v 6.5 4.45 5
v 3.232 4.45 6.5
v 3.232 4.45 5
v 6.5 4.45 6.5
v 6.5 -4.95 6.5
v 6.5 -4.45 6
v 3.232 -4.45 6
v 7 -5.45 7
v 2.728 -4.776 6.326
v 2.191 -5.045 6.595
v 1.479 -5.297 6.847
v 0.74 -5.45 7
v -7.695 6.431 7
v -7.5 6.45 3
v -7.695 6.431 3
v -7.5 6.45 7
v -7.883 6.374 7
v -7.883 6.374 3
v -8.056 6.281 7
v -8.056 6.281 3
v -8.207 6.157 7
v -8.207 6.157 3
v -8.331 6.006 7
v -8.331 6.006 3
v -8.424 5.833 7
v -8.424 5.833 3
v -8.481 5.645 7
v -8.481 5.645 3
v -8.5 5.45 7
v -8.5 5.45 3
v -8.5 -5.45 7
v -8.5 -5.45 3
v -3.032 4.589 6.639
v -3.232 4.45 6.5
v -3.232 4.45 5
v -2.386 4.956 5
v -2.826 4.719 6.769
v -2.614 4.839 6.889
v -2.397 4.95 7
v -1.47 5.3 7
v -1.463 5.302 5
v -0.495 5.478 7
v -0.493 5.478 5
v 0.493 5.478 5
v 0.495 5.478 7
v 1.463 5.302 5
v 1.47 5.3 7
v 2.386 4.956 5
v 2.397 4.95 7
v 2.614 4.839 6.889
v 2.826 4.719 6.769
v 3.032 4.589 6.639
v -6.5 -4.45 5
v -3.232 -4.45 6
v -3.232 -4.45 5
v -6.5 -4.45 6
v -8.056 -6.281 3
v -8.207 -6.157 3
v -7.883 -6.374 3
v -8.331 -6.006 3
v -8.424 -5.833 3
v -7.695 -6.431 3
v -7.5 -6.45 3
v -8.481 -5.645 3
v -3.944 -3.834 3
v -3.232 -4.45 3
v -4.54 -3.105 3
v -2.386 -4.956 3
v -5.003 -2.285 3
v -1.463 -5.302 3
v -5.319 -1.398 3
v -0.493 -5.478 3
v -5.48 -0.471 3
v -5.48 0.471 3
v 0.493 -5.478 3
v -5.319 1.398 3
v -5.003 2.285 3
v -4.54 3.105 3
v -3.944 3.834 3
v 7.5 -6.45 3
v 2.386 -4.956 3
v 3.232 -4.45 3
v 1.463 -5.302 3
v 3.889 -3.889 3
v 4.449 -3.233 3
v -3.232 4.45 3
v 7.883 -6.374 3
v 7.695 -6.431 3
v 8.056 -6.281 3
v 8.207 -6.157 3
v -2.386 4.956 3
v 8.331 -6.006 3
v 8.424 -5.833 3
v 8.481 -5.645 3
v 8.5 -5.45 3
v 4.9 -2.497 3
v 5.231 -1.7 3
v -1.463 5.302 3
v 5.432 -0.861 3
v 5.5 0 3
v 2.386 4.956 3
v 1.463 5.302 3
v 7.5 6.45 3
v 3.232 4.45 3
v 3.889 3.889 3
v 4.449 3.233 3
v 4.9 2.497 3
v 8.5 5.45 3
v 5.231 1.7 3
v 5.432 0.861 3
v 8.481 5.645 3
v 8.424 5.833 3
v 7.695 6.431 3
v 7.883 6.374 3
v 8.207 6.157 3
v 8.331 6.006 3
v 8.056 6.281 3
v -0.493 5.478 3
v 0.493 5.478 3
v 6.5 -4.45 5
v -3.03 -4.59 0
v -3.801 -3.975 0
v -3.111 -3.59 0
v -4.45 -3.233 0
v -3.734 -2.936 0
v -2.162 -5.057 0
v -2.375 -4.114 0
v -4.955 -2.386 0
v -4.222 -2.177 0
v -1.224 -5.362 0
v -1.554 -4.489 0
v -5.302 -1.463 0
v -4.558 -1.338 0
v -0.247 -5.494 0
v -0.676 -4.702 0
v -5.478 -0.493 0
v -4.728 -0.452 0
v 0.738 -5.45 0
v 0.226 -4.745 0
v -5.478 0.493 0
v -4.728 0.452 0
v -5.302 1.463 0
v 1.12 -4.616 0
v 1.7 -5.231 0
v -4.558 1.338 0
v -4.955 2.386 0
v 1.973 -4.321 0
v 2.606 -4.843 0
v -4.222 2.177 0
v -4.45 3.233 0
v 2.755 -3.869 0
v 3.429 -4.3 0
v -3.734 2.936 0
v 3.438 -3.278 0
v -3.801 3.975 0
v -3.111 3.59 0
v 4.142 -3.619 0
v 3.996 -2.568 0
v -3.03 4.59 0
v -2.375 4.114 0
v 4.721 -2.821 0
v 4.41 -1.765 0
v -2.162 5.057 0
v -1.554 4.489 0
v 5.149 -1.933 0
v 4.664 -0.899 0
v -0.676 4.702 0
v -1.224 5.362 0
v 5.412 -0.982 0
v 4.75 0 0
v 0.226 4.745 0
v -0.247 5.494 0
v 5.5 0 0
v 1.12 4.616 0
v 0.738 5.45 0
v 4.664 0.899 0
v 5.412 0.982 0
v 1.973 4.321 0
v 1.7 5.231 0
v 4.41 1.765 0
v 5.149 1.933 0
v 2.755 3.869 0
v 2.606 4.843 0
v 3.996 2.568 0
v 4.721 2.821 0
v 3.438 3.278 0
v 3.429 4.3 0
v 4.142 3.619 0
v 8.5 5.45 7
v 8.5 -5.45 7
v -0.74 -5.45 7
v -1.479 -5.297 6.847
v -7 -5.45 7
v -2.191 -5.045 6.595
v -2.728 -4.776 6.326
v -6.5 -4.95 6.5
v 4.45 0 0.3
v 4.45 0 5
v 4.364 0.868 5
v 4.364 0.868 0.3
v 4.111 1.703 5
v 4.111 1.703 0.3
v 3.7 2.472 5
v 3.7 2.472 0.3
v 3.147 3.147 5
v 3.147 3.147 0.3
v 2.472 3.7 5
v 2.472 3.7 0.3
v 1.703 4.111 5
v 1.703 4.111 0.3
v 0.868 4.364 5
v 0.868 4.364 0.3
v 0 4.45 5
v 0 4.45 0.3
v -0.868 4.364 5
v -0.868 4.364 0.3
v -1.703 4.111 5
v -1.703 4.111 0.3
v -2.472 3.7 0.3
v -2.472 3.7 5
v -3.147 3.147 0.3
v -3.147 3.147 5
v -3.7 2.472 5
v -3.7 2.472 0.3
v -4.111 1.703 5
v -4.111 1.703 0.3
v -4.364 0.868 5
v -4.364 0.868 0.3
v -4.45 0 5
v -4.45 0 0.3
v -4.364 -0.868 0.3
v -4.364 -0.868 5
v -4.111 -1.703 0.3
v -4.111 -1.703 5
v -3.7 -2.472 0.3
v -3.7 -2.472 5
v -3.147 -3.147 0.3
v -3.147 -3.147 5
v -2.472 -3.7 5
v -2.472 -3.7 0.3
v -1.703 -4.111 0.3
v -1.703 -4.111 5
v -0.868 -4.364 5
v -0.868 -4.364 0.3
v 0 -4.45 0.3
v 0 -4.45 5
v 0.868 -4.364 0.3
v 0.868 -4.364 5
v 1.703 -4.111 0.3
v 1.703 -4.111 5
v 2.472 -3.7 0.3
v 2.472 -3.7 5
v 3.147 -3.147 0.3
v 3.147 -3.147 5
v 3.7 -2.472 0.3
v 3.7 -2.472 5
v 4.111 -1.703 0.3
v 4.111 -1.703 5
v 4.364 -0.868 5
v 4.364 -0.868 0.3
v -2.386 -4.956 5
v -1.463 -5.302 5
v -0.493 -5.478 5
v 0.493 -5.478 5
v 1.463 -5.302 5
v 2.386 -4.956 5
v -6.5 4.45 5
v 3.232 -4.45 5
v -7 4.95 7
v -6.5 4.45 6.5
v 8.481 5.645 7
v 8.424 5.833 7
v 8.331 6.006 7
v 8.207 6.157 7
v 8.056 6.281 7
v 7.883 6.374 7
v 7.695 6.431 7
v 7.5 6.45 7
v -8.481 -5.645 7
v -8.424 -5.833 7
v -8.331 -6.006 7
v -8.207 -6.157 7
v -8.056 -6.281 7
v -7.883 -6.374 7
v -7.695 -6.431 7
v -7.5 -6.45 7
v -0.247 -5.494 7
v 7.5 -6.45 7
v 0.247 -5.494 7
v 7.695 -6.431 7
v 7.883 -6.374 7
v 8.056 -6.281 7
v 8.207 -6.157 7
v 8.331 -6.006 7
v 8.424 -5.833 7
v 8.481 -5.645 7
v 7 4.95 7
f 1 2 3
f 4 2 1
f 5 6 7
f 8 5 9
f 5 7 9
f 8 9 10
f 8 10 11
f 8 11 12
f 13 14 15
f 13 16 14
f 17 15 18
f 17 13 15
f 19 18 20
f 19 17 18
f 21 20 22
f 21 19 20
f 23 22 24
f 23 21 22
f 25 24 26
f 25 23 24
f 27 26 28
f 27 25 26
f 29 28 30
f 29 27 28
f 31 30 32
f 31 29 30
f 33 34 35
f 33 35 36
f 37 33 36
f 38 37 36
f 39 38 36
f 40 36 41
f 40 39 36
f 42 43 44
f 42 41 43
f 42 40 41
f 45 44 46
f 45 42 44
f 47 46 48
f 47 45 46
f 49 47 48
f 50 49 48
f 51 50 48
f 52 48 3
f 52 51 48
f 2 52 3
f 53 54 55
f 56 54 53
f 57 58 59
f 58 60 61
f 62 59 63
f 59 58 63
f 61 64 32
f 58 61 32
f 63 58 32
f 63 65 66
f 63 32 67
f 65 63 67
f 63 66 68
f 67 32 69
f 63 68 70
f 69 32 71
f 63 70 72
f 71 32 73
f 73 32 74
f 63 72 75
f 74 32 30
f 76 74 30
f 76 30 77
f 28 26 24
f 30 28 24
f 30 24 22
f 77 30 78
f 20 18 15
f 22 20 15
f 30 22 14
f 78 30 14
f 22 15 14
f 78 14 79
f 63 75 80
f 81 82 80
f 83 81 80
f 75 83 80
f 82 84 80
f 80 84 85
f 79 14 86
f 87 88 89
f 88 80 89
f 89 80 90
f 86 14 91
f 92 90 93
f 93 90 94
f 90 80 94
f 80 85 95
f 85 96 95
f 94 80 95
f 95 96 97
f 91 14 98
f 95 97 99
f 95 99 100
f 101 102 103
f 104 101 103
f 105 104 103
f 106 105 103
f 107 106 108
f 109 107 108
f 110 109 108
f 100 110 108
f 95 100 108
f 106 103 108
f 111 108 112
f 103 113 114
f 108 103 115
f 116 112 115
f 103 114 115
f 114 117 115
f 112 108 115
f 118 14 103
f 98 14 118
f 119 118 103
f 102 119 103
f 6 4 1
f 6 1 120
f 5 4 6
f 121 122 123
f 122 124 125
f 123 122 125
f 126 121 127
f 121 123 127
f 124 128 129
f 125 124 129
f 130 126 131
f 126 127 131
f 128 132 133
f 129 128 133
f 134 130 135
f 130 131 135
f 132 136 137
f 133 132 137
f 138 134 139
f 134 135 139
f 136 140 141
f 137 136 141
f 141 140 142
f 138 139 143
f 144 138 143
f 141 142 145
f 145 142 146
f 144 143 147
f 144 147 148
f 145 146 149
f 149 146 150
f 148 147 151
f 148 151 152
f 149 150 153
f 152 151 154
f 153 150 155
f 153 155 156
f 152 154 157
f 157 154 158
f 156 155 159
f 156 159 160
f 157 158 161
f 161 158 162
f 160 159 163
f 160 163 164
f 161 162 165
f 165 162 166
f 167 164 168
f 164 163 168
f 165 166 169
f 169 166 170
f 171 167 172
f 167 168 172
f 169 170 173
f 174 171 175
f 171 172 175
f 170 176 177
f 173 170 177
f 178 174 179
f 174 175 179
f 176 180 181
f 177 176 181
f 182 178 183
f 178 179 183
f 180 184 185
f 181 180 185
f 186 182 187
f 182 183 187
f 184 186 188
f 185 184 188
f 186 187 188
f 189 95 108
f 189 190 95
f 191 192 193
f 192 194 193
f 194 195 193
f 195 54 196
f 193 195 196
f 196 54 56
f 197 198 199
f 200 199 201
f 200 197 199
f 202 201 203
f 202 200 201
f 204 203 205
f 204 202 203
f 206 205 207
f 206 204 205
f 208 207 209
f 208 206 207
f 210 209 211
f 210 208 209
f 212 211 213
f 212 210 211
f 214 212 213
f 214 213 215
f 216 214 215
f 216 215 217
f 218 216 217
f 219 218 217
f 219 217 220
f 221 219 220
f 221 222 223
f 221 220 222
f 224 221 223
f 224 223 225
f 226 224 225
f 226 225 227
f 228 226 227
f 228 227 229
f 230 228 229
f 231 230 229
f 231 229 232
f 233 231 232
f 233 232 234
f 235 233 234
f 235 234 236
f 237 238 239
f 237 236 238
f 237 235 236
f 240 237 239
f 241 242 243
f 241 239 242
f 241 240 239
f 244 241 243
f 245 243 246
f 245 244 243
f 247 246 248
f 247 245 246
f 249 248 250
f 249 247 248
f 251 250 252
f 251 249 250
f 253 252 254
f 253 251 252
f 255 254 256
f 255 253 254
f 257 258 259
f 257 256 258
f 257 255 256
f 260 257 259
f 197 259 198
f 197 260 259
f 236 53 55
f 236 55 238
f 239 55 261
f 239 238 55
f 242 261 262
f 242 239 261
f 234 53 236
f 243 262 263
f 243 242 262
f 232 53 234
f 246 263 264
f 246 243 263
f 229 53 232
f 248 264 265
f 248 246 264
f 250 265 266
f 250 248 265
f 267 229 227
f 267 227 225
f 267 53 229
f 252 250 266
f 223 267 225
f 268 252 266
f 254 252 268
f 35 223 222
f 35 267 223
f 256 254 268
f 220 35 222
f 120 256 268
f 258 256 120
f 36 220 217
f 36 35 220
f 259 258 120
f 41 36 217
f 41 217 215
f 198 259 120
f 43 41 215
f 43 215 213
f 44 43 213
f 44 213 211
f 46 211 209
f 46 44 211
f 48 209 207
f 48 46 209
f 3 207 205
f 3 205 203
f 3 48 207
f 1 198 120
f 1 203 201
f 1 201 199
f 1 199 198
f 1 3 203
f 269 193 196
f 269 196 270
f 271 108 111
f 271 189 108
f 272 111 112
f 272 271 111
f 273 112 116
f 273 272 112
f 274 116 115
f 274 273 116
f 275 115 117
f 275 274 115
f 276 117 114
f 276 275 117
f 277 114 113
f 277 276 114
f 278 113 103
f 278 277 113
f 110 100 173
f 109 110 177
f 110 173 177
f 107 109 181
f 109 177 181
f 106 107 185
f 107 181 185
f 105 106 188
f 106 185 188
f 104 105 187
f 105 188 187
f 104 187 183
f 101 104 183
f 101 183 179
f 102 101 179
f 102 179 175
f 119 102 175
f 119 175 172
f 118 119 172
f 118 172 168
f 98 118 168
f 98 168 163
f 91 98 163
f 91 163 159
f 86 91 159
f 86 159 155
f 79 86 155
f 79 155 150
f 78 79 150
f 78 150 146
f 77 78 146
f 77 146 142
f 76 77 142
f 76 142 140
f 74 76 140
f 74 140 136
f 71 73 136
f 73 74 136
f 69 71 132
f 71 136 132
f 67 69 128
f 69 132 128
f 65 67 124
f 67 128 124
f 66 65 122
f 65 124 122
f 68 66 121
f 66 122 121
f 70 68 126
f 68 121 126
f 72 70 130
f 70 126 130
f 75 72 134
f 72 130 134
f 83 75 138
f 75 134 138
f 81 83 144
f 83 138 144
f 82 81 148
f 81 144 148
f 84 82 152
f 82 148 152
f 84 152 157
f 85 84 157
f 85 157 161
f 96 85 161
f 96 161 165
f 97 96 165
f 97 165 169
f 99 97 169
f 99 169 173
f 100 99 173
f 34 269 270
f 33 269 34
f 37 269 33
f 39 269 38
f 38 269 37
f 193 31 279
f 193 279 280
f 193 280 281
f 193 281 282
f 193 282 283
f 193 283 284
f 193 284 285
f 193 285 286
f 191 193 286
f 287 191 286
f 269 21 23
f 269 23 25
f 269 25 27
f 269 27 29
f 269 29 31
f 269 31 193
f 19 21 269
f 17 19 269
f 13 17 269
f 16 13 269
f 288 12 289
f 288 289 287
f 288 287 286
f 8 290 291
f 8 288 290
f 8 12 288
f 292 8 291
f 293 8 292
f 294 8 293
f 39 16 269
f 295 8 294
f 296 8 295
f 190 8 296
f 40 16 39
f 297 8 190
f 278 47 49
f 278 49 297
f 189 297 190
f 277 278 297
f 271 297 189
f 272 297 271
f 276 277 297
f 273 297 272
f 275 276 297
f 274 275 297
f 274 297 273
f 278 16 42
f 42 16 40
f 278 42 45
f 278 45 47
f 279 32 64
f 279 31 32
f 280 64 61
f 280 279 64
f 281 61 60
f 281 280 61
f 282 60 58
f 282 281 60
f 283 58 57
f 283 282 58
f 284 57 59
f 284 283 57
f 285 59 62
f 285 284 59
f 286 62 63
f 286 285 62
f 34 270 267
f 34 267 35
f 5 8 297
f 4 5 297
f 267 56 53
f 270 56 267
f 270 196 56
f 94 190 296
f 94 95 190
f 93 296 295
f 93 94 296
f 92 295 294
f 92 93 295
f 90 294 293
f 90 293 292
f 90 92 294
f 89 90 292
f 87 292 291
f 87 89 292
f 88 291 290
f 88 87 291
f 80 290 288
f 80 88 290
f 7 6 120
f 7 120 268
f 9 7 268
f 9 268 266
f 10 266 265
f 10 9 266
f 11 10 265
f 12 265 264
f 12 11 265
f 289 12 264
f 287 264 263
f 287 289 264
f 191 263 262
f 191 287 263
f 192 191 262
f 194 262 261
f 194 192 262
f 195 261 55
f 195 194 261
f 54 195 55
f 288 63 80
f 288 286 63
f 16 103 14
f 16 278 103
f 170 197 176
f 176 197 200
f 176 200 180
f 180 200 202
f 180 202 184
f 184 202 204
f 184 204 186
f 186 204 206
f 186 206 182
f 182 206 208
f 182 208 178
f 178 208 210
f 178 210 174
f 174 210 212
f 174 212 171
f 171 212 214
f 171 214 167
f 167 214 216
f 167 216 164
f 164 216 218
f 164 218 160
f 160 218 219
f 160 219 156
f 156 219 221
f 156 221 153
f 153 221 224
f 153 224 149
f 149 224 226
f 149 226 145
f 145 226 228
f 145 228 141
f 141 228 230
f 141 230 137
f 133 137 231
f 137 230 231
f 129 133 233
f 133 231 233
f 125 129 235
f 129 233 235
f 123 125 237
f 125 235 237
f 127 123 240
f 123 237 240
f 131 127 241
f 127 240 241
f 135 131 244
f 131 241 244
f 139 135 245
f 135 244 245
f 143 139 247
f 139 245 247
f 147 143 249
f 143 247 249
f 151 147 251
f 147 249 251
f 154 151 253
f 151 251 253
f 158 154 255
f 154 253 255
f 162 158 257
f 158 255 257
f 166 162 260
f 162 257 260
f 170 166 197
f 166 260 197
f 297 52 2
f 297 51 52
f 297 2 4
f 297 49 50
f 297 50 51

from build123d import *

# Parameters (mm, degrees)
F0_R     = 5.5
F0_R_2   = 4.45
F1_DEPTH = 5
F3_DEPTH = 2
F4_DEPTH = 2
F5_SIZE  = 1
F6_SIZE  = 0.5
F7_SIZE  = 0.3
F8_R     = 1


with BuildPart() as f1:
    # F0 (on Top) → F1 (new body)
    with BuildSketch(Plane.XY):
        Circle(F0_R)
        Circle(F0_R_2, mode=Mode.SUBTRACT)
    extrude(amount=F1_DEPTH)

    # F2 (on face) → F3 (join)
    with BuildSketch(Plane.XY.offset(5)):
        with BuildLine():
            Line((-3.2322592718, -4.45), (0, -4.45))
            ThreePointArc((0, -4.45), (-4.45, 0), (0, 4.45))
            Line((0, 4.45), (-3.2322592718, 4.45))
            ThreePointArc((-3.2322592718, 4.45), (-5.5, 0), (-3.2322592718, -4.45))
        make_face()
        with BuildLine():
            Line((0, -4.45), (3.2322592718, -4.45))
            ThreePointArc((3.2322592718, -4.45), (4.9003788626, -2.4972558945), (5.5, 0))
            ThreePointArc((5.5, 0), (4.9003788626, 2.4972558945), (3.2322592718, 4.45))
            Line((3.2322592718, 4.45), (0, 4.45))
            ThreePointArc((0, 4.45), (3.1466251763, 3.1466251763), (4.45, 0))
            ThreePointArc((4.45, 0), (3.1466251763, -3.1466251763), (0, -4.45))
        make_face()
        with BuildLine():
            Line((-6.5, -4.45), (-3.2322592718, -4.45))
            ThreePointArc((-3.2322592718, -4.45), (-5.5, 0), (-3.2322592718, 4.45))
            Line((-3.2322592718, 4.45), (-6.5, 4.45))
            Line((-6.5, 4.45), (-6.5, -4.45))
        make_face()
        with BuildLine():
            Line((3.2322592718, -4.45), (6.5, -4.45))
            Line((6.5, -4.45), (6.5, 4.45))
            Line((6.5, 4.45), (3.2322592718, 4.45))
            ThreePointArc((3.2322592718, 4.45), (4.9003788626, 2.4972558945), (5.5, 0))
            ThreePointArc((5.5, 0), (4.9003788626, -2.4972558945), (3.2322592718, -4.45))
        make_face()
    extrude(amount=-F3_DEPTH)

    # F2 (on face) → F4 (join, symmetric)
    with BuildSketch(Plane.XY.offset(5)):
        with BuildLine():
            Line((6.5, 4.45), (6.5, -4.45))
            Line((6.5, -4.45), (6.5, -6.45))
            Line((6.5, -6.45), (8.5, -6.45))
            Line((8.5, -6.45), (8.5, 6.45))
            Line((8.5, 6.45), (-8.5, 6.45))
            Line((-8.5, 6.45), (-8.5, -6.45))
            Line((-8.5, -6.45), (-6.5, -6.45))
            Line((-6.5, -6.45), (-6.5, -4.45))
            Line((-6.5, -4.45), (-6.5, 4.45))
            Line((-6.5, 4.45), (-3.2322592718, 4.45))
            ThreePointArc((-3.2322592718, 4.45), (0, 5.5), (3.2322592718, 4.45))
            Line((3.2322592718, 4.45), (6.5, 4.45))
        make_face()
        with BuildLine():
            Line((6.5, -6.45), (6.5, -4.45))
            Line((6.5, -4.45), (3.2322592718, -4.45))
            ThreePointArc((3.2322592718, -4.45), (0, -5.5), (-3.2322592718, -4.45))
            Line((-3.2322592718, -4.45), (-6.5, -4.45))
            Line((-6.5, -4.45), (-6.5, -6.45))
            Line((-6.5, -6.45), (6.5, -6.45))
        make_face()
    extrude(amount=F4_DEPTH, both=True)

    # F5
    f5_edges = [f1.edges().sort_by_distance(p)[0] for p in [
        (-4.86613, -4.45, 7),
        (4.86613, -4.45, 7),
    ]]
    chamfer(f5_edges, length=F5_SIZE)

    # F6
    f6_edges = [f1.edges().sort_by_distance(p)[0] for p in [
        (-4.86613, 4.45, 7),
        (-6.5, 0, 7),
        (6.5, 0, 7),
        (4.86613, 4.45, 7),
    ]]
    chamfer(f6_edges, length=F6_SIZE)

    # F7
    f7_edges = [f1.edges().sort_by_distance(p)[0] for p in [
        (-4.45, 0, 0),
    ]]
    chamfer(f7_edges, length=F7_SIZE)

    # F8
    f8_edges = [f1.edges().sort_by_distance(p)[0] for p in [
        (-8.5, -6.45, 5),
        (8.5, -6.45, 5),
        (8.5, 6.45, 5),
        (-8.5, 6.45, 5),
    ]]
    fillet(f8_edges, radius=F8_R)


solid = f1.part
